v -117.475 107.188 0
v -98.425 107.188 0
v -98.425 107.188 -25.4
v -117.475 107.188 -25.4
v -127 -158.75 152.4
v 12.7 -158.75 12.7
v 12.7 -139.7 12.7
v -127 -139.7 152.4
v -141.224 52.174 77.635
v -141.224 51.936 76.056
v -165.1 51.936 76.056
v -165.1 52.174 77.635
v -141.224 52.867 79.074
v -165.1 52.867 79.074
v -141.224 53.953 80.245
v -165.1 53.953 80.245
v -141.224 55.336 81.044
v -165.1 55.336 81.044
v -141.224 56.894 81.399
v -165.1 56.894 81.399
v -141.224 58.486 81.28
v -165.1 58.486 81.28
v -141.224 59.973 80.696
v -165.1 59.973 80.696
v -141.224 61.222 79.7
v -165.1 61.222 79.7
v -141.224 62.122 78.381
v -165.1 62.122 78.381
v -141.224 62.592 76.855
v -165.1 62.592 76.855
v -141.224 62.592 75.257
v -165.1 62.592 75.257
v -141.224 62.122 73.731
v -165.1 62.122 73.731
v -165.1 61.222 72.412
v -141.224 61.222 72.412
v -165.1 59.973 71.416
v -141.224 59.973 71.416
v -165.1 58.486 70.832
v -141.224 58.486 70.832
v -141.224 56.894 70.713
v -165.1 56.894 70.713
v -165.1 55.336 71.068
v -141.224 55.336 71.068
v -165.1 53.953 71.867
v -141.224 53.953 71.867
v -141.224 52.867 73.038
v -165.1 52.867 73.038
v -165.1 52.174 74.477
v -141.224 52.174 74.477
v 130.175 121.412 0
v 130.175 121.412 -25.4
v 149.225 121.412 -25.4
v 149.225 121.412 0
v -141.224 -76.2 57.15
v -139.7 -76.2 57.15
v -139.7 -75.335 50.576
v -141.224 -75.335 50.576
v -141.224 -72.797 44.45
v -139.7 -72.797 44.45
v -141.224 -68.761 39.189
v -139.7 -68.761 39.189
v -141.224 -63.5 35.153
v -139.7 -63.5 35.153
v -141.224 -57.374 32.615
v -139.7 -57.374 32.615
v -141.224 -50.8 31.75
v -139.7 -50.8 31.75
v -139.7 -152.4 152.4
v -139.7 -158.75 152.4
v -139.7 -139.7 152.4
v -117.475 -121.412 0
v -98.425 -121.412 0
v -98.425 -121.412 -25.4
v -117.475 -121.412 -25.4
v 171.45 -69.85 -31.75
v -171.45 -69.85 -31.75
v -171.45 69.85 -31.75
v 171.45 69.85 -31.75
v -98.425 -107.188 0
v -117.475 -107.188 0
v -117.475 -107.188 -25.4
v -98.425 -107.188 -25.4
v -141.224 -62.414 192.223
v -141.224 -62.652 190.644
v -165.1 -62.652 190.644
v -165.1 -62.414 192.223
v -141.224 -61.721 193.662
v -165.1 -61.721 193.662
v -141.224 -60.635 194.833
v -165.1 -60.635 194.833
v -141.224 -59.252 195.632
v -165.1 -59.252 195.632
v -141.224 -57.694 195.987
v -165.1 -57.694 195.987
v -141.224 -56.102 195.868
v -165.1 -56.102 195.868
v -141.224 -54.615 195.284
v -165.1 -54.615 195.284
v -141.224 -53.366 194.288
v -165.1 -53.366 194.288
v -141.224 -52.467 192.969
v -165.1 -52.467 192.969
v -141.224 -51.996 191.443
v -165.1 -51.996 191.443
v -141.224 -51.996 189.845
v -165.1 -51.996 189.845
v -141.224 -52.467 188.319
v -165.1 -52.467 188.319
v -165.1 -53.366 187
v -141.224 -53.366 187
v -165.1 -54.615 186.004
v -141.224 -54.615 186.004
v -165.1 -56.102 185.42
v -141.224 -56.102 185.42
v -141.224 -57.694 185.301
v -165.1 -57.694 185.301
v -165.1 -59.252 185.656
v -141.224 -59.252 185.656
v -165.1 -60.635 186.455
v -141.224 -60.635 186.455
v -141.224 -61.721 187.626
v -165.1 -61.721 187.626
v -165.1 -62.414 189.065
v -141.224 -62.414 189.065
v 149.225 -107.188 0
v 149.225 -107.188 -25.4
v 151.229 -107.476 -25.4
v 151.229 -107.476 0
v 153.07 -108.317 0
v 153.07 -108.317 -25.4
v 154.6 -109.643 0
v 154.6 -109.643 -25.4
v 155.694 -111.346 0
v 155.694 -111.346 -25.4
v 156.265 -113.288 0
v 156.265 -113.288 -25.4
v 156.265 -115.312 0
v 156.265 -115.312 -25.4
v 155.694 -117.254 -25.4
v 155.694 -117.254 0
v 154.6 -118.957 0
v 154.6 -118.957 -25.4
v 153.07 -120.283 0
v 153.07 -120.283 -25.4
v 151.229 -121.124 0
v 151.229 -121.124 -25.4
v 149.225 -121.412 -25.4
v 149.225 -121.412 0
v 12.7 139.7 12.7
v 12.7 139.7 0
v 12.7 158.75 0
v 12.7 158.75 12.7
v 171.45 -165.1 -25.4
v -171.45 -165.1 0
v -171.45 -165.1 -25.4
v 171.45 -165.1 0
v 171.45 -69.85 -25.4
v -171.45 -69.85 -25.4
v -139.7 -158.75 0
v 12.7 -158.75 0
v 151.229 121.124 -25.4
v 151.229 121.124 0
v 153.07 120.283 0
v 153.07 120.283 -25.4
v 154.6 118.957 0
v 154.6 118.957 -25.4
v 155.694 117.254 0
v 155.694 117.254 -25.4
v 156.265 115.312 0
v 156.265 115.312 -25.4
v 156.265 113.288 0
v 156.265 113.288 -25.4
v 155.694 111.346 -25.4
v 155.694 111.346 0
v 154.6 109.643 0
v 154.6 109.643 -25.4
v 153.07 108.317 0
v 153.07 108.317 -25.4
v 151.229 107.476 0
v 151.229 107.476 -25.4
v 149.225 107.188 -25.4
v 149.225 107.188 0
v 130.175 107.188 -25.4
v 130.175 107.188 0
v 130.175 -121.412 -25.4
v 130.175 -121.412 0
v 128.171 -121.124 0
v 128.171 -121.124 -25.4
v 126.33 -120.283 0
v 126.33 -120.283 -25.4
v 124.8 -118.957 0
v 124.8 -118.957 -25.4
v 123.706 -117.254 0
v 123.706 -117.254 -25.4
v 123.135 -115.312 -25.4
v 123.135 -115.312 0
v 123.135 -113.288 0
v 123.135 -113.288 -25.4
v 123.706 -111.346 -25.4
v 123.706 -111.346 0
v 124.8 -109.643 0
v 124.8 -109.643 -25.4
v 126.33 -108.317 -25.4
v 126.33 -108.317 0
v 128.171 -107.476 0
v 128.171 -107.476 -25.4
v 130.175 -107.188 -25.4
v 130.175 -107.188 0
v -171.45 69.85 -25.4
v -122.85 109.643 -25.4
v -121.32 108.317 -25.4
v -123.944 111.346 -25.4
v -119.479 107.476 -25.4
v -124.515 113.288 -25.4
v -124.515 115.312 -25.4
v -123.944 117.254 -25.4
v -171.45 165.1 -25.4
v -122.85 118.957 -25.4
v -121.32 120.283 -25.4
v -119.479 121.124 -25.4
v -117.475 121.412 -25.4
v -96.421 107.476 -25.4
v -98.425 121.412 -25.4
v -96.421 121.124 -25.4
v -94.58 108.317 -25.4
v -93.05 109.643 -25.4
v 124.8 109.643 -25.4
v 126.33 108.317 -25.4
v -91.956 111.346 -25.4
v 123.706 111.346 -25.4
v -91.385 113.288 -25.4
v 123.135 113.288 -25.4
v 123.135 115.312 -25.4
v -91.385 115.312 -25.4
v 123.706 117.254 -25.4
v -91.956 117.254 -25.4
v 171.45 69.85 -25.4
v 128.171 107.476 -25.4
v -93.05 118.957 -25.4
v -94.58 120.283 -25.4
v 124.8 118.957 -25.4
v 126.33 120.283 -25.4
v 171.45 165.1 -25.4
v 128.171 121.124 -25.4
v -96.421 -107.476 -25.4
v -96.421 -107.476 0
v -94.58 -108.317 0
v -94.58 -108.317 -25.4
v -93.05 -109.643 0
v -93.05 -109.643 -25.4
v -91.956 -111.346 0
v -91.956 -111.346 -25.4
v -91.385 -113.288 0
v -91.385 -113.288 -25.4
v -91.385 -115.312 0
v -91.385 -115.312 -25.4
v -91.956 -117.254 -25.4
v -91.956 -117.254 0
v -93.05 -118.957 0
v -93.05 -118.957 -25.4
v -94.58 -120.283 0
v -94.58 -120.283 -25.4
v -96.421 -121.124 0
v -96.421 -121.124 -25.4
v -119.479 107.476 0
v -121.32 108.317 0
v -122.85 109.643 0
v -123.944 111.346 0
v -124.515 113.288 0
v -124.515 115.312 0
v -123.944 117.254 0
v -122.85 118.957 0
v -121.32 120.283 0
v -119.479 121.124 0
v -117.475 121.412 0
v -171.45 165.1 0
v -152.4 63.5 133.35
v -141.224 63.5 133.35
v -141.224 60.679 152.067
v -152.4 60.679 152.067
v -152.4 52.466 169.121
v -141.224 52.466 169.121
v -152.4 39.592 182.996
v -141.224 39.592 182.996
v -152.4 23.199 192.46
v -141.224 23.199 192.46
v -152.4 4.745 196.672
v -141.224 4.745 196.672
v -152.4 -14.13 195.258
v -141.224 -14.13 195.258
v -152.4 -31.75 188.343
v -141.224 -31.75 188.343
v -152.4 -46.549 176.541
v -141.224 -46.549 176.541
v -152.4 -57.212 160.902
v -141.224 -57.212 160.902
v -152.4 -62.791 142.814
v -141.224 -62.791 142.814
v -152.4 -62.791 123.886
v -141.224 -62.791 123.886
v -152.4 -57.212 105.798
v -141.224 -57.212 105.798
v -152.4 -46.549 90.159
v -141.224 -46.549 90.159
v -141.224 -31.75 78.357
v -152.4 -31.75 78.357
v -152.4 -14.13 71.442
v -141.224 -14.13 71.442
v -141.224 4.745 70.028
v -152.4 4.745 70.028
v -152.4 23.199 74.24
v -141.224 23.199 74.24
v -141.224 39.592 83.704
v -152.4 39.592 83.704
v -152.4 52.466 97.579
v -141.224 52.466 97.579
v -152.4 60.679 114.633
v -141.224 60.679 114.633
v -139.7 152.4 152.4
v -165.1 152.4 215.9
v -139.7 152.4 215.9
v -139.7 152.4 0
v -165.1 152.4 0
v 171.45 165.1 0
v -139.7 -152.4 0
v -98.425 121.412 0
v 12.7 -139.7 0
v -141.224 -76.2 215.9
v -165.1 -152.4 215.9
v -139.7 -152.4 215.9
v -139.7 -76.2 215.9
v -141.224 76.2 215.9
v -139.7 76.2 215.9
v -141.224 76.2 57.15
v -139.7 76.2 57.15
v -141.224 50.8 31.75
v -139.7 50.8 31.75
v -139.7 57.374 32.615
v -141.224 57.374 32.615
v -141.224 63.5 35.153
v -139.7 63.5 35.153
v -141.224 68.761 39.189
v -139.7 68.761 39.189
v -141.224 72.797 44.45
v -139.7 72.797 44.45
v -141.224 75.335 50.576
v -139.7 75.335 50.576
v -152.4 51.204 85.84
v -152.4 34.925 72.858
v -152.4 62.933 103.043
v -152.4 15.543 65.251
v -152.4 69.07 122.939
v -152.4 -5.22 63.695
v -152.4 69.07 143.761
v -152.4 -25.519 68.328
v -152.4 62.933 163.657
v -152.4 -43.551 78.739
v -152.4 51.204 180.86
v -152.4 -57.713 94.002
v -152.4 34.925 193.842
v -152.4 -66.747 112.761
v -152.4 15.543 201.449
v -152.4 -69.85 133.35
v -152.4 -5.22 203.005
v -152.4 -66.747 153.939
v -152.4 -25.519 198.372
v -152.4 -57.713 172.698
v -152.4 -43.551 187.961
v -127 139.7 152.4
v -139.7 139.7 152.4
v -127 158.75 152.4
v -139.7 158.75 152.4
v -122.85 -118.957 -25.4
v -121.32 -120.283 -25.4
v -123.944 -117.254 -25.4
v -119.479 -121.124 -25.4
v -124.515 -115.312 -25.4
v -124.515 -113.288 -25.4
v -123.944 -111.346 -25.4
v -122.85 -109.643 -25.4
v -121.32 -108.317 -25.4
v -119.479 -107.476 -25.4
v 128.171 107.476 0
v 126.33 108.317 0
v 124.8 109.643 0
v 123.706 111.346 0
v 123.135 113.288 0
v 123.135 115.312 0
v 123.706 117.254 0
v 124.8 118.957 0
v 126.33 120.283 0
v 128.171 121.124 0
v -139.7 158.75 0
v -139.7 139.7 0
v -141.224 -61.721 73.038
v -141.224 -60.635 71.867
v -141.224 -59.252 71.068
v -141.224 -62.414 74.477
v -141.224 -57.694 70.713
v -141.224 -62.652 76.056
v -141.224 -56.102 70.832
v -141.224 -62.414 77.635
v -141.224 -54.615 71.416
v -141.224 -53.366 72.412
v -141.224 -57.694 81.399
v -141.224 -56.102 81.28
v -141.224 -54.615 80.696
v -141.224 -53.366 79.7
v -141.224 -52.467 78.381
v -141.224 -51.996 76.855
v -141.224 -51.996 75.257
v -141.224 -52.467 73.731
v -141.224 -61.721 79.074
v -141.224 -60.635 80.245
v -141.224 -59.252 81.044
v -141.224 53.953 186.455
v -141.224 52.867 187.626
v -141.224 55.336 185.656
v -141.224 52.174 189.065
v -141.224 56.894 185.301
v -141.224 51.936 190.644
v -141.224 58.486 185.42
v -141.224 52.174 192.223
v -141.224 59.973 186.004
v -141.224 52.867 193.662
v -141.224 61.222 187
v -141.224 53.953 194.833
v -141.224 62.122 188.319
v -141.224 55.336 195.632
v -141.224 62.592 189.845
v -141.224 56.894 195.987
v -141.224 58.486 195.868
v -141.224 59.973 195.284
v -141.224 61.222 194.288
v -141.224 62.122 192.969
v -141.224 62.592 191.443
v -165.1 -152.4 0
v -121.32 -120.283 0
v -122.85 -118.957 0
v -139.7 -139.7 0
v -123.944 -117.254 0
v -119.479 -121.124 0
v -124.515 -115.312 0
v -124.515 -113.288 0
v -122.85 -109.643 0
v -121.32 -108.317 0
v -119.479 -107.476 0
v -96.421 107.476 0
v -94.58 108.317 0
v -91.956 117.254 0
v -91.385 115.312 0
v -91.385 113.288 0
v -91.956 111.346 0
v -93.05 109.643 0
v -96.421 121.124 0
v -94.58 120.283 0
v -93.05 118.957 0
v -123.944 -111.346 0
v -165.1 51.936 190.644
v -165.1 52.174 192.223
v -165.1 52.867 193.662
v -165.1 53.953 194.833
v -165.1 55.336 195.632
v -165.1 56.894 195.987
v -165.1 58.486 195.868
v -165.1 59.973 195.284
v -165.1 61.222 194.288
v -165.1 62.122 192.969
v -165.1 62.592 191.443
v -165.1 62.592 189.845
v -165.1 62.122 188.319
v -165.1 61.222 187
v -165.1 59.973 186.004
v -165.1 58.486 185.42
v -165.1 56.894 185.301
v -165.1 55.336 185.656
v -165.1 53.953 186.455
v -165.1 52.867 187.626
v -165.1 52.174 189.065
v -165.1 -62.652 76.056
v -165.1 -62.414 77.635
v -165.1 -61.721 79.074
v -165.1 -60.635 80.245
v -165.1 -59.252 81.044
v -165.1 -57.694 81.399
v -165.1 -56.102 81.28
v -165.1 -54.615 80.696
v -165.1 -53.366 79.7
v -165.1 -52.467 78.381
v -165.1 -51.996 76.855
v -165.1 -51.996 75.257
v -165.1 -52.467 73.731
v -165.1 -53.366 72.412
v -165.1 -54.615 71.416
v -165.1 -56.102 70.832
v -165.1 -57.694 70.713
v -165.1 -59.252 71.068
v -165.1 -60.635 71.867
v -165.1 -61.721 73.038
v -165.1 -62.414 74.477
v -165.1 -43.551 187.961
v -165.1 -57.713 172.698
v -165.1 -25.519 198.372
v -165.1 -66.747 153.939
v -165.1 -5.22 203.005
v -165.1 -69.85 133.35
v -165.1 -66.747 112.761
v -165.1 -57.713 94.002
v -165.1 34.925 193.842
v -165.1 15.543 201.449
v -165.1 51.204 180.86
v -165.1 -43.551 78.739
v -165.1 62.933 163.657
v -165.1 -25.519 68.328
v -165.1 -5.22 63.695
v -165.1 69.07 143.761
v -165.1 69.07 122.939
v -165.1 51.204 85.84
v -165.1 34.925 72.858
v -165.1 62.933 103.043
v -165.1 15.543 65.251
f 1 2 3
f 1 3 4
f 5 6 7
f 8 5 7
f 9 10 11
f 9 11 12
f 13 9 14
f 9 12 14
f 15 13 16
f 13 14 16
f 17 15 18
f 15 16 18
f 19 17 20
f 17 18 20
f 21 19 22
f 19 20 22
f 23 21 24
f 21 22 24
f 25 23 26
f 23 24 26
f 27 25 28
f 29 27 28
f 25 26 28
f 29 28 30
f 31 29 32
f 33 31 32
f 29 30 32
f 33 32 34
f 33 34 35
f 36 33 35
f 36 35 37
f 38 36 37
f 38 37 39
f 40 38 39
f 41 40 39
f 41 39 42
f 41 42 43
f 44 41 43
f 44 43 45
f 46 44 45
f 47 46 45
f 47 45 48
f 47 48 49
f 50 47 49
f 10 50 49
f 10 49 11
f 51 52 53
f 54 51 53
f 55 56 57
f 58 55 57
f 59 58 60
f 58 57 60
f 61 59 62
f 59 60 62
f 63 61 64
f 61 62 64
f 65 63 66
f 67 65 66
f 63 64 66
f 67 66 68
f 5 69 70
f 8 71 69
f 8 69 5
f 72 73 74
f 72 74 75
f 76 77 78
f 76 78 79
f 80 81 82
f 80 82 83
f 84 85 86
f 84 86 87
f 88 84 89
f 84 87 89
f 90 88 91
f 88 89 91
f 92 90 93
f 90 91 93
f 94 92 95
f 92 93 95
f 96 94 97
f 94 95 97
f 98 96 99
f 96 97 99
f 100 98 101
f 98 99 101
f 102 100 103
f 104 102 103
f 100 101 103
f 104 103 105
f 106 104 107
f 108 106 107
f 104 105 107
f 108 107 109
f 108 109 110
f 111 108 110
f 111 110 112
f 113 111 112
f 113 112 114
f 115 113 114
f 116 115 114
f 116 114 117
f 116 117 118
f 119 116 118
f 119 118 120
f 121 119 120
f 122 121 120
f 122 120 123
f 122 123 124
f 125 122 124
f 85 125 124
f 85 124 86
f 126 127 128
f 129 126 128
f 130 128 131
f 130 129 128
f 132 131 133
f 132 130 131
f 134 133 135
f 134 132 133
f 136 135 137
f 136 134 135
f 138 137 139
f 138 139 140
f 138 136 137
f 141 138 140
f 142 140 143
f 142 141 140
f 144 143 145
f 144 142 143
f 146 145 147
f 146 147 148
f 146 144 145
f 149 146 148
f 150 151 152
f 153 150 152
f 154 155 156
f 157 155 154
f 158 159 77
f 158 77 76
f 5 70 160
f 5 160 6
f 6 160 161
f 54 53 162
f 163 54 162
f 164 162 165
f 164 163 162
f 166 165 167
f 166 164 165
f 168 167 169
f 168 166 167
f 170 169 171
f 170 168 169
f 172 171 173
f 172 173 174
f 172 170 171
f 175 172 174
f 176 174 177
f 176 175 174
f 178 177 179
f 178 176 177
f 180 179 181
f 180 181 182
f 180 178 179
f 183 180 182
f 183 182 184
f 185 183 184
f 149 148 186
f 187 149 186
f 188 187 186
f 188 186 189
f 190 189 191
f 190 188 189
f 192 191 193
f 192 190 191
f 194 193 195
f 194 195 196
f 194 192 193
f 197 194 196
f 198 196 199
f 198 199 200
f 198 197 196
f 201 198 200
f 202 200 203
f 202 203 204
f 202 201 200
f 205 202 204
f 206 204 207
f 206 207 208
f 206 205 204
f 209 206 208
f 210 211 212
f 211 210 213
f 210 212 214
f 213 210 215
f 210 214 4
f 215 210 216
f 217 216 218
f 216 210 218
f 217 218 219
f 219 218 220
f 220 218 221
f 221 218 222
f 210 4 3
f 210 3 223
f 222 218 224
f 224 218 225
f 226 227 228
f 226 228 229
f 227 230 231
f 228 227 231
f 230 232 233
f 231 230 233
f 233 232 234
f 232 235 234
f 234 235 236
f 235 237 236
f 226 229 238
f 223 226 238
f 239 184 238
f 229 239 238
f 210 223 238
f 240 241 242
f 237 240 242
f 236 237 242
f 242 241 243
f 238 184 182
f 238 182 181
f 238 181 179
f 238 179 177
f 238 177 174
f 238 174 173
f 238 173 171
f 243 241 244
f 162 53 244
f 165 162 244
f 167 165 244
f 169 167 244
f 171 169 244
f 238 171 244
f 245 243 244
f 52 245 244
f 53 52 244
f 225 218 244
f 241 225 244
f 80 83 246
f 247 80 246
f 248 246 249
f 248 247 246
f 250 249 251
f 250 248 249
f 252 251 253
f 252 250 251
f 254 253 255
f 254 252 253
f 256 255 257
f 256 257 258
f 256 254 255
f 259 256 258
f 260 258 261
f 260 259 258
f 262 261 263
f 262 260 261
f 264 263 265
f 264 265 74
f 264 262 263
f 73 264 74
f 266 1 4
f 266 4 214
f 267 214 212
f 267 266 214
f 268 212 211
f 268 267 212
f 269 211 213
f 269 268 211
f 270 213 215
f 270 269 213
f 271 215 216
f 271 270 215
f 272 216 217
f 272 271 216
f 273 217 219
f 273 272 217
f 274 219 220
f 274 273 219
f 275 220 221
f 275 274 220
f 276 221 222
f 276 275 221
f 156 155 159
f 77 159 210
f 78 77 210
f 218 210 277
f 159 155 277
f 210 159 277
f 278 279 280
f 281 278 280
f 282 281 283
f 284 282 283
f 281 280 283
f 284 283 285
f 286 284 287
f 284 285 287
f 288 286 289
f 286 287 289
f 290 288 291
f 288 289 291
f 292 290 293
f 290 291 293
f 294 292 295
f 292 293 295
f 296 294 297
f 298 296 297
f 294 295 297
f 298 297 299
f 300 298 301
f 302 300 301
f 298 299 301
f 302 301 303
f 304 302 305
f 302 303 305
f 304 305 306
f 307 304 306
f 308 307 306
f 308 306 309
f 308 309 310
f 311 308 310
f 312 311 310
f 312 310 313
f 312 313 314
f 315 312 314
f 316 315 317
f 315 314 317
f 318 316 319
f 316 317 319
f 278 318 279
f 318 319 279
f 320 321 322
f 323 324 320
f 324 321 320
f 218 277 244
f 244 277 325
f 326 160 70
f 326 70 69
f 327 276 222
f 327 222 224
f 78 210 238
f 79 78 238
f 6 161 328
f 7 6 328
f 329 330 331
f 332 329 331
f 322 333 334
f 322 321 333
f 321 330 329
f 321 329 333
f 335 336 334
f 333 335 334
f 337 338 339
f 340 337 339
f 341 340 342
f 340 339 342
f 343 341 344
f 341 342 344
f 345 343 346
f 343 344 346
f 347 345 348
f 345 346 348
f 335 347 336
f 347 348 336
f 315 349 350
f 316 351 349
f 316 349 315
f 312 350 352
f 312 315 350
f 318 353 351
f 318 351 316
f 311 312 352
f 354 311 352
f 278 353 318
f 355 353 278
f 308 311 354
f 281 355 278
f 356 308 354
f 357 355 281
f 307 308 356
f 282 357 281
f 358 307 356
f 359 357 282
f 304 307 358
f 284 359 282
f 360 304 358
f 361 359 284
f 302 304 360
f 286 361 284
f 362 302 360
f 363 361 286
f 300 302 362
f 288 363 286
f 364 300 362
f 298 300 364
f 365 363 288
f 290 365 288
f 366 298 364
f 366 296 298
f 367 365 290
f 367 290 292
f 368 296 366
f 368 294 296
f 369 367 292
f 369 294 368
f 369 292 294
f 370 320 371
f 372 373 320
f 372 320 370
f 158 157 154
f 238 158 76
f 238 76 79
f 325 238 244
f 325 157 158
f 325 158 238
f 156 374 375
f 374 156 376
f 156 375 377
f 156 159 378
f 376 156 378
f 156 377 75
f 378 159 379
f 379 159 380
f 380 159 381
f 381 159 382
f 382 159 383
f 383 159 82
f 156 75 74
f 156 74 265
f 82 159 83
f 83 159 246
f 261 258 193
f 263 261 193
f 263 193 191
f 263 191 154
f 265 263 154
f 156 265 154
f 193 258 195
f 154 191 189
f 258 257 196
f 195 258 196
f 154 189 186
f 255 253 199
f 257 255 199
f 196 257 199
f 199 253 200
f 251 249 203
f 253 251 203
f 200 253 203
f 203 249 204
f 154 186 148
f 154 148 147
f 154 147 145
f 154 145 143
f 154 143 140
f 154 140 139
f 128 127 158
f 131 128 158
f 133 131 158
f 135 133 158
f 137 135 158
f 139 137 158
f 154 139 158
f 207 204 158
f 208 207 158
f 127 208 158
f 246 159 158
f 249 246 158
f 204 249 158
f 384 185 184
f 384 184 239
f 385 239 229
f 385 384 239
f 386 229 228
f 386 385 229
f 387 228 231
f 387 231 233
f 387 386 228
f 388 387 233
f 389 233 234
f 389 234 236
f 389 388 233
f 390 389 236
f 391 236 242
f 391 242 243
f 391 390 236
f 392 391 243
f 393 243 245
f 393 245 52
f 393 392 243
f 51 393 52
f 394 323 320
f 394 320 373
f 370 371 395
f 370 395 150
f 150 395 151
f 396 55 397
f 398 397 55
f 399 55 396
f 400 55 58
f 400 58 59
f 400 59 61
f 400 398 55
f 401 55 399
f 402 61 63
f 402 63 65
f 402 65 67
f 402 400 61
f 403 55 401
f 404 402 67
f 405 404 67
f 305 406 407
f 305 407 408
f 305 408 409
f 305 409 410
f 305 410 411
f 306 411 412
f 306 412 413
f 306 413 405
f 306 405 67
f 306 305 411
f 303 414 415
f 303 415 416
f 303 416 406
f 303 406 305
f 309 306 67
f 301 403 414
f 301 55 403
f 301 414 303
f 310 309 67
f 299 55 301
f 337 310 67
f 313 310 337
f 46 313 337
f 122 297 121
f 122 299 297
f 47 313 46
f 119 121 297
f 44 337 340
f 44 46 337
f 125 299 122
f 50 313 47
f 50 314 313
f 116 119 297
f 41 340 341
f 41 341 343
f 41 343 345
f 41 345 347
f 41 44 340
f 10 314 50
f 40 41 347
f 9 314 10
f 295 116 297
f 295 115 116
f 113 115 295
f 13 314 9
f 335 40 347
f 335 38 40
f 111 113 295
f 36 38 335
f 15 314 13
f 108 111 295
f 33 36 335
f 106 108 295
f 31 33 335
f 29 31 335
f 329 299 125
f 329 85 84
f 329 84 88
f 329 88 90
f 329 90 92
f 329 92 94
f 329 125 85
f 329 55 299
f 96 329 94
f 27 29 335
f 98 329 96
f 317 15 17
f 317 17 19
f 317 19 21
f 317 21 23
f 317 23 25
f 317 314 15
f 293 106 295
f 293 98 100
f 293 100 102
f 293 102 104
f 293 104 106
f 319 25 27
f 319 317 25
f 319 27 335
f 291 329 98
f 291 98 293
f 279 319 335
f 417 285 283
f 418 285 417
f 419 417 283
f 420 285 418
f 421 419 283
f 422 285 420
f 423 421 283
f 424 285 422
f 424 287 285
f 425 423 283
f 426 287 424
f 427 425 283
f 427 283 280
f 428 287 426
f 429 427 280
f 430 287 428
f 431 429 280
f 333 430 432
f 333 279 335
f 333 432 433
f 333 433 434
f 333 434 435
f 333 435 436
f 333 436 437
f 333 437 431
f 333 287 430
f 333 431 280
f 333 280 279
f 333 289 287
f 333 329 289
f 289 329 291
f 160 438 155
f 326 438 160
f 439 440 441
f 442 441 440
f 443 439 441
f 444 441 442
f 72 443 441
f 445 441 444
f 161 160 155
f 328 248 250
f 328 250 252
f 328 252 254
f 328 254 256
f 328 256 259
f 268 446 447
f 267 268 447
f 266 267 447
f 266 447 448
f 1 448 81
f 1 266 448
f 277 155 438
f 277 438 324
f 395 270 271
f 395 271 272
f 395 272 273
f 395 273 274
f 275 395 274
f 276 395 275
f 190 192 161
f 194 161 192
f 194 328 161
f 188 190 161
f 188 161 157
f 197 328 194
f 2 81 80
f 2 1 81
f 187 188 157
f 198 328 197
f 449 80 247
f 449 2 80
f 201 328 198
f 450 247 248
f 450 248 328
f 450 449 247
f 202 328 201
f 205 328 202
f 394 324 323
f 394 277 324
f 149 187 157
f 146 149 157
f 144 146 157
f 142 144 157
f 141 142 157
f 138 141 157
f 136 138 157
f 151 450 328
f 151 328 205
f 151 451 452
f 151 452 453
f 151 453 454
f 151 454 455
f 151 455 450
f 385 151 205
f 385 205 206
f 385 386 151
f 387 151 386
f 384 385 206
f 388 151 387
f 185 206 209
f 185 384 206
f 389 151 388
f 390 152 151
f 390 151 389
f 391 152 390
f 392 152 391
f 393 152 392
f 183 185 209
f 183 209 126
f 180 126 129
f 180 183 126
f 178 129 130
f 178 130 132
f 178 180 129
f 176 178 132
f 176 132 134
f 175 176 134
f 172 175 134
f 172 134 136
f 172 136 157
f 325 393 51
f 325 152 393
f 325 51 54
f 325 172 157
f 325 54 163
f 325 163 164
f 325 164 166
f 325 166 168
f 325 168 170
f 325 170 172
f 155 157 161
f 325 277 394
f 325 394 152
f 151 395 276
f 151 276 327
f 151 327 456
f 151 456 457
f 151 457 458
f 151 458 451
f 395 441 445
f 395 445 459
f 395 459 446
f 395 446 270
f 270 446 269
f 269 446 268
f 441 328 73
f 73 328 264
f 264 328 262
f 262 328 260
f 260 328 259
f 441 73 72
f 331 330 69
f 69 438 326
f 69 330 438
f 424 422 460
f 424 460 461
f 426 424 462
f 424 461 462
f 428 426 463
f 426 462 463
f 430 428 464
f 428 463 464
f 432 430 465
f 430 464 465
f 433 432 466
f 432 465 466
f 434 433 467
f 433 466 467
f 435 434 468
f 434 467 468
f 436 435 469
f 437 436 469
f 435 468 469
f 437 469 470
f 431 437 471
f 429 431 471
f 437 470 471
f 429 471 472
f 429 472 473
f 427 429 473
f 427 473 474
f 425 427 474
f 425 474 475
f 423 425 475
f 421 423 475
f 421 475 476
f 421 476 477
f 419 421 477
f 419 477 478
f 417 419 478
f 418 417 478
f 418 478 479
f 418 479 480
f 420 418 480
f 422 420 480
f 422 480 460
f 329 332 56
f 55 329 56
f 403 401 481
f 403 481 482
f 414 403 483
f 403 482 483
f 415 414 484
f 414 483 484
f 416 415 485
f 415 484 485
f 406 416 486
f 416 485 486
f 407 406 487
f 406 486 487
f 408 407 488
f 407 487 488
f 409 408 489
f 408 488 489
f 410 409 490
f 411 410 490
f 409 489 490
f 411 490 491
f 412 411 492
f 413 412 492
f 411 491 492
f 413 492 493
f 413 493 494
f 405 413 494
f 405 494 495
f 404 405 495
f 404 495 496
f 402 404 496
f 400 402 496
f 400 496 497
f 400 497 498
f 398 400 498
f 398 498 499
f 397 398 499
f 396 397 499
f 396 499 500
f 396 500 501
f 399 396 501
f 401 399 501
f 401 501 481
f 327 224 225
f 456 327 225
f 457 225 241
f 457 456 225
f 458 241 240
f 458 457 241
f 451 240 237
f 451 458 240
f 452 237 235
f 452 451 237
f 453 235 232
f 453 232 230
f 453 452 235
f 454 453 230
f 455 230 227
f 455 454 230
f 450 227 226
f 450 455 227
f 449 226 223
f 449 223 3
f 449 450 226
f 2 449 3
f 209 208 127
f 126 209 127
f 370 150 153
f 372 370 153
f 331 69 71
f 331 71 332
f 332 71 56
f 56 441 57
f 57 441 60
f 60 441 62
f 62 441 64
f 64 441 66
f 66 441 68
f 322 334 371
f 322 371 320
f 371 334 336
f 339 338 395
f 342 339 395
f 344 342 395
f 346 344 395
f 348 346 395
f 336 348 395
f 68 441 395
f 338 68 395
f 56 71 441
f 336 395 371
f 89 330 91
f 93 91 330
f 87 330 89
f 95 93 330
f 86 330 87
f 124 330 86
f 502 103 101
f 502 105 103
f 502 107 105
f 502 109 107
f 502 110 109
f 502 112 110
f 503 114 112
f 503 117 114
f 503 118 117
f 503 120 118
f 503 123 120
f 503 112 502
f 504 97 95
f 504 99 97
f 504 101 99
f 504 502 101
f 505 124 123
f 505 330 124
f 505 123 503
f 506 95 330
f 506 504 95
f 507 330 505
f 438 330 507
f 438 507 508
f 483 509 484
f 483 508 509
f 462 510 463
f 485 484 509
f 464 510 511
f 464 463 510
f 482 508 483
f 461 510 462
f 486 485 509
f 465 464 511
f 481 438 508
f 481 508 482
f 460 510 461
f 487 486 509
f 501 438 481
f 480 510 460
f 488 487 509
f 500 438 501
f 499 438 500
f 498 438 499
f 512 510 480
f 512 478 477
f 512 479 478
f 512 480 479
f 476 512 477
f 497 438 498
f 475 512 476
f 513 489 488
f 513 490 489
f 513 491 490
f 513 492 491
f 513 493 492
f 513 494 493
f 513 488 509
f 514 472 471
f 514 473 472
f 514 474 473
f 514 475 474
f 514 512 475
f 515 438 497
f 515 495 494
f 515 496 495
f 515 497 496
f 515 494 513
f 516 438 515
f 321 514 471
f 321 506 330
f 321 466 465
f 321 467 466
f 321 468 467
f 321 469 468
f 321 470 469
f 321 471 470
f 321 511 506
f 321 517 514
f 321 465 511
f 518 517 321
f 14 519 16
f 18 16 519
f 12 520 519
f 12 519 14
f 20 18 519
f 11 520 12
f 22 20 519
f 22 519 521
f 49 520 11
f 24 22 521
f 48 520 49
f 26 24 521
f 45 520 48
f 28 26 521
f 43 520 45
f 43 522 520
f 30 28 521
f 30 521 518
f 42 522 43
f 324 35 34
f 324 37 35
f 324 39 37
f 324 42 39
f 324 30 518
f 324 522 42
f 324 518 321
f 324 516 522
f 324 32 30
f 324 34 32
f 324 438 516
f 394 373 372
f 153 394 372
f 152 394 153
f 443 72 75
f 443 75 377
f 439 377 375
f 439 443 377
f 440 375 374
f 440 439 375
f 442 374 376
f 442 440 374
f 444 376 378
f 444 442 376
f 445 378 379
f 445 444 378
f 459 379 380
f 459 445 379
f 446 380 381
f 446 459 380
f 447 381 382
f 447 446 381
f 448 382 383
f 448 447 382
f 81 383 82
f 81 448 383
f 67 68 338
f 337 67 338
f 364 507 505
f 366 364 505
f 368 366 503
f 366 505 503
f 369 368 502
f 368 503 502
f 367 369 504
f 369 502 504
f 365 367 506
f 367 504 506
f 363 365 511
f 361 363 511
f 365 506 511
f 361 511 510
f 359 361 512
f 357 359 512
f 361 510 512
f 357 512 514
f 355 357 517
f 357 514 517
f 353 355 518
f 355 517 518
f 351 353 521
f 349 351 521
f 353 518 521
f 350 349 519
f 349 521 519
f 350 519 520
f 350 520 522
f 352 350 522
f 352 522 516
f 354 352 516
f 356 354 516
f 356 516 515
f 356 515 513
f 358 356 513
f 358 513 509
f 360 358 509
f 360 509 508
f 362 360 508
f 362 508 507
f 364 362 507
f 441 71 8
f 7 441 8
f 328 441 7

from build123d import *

# Parameters (mm, degrees)
F0_W           = 342.9
F0_H           = 330.2
F1_DEPTH       = 25.4
F2_W           = 342.9
F2_H           = 139.7
F3_DEPTH       = 6.35
F4_W           = 25.4
F4_H           = 304.8
F5_DEPTH       = 215.9
F7_D           = 127
F7_CBORE_D     = 139.7
F7_CBORE_DEPTH = 12.7
F9_DEPTH       = 1.524
F11_D          = 10.71626
F12_W          = 152.4
F12_H          = 19.05
F13_DEPTH      = 152.4
F14_SIZE       = 139.7


with BuildPart() as f1:
    # F0 (on Top) → F1 (new body)
    with BuildSketch(Plane.XY):
        Rectangle(F0_W, F0_H)
        with BuildLine():
            Line((-98.425, -121.412), (-117.475, -121.412))
            ThreePointArc((-117.475, -121.412), (-124.587, -114.3), (-117.475, -107.188))
            Line((-117.475, -107.188), (-98.425, -107.188))
            ThreePointArc((-98.425, -107.188), (-91.313, -114.3), (-98.425, -121.412))
        make_face(mode=Mode.SUBTRACT)
        with BuildLine():
            Line((149.225, -121.412), (130.175, -121.412))
            ThreePointArc((130.175, -121.412), (123.063, -114.3), (130.175, -107.188))
            Line((130.175, -107.188), (149.225, -107.188))
            ThreePointArc((149.225, -107.188), (156.337, -114.3), (149.225, -121.412))
        make_face(mode=Mode.SUBTRACT)
        with BuildLine():
            Line((-98.425, 107.188), (-117.475, 107.188))
            ThreePointArc((-117.475, 107.188), (-124.587, 114.3), (-117.475, 121.412))
            Line((-117.475, 121.412), (-98.425, 121.412))
            ThreePointArc((-98.425, 121.412), (-91.313, 114.3), (-98.425, 107.188))
        make_face(mode=Mode.SUBTRACT)
        with BuildLine():
            Line((149.225, 107.188), (130.175, 107.188))
            ThreePointArc((130.175, 107.188), (123.063, 114.3), (130.175, 121.412))
            Line((130.175, 121.412), (149.225, 121.412))
            ThreePointArc((149.225, 121.412), (156.337, 114.3), (149.225, 107.188))
        make_face(mode=Mode.SUBTRACT)
    extrude(amount=-F1_DEPTH)

    # F2 (on face) → F3 (join)
    with BuildSketch(Plane(origin=(0, 0, -25.4), x_dir=(1, 0, 0), z_dir=(0, 0, -1))):
        Rectangle(F2_W, F2_H)
    extrude(amount=F3_DEPTH)

    # F4 (on face) → F5 (join)
    with BuildSketch(Plane.XY):
        with Locations((-152.4, 0)):
            Rectangle(F4_W, F4_H)
    extrude(amount=F5_DEPTH)

    # F7 (through all)
    with Locations(Plane(origin=(-165.1, 0, 0), x_dir=(0, -1, 0), z_dir=(-1, 0, 0))):
        with Locations((0, 133.35)):
            CounterBoreHole(F7_D / 2, F7_CBORE_D / 2, F7_CBORE_DEPTH)

    # F8 (on face) → F9 (cut)
    with BuildSketch(Plane.YZ.offset(-139.7)):
        with BuildLine():
            Line((0, 31.75), (50.8, 31.75))
            ThreePointArc((50.8, 31.75), (68.7605122421, 39.1894877579), (76.2, 57.15))
            Line((76.2, 57.15), (76.2, 215.9))
            Line((76.2, 215.9), (0, 215.9))
            Line((0, 215.9), (0, 31.75))
        make_face()
        with BuildLine():
            Line((-50.8, 31.75), (0, 31.75))
            Line((0, 31.75), (0, 215.9))
            Line((0, 215.9), (-76.2, 215.9))
            Line((-76.2, 215.9), (-76.2, 57.15))
            ThreePointArc((-76.2, 57.15), (-68.7605122421, 39.1894877579), (-50.8, 31.75))
        make_face()
    extrude(amount=-F9_DEPTH, mode=Mode.SUBTRACT)

    # F11 (through all)
    with Locations(Plane.YZ.offset(-141.224)):
        with Locations((57.2940340524, 190.6440340524), (57.2940340524, 76.0559659476), (-57.2940340524, 76.0559659476), (-57.2940340524, 190.6440340524)):
            Hole(F11_D / 2)

    # F12 (on face) → F13 (join)
    with BuildSketch(Plane.XY):
        with Locations((-63.5, 149.225)):
            Rectangle(F12_W, F12_H)
        with Locations((-63.5, -149.225)):
            Rectangle(F12_W, F12_H)
    extrude(amount=F13_DEPTH)

    # F14
    f14_edges = [f1.edges().sort_by_distance(p)[0] for p in [
        (12.7, 149.225, 152.4),
        (12.7, -149.225, 152.4),
    ]]
    chamfer(f14_edges, length=F14_SIZE)


solid = f1.part
